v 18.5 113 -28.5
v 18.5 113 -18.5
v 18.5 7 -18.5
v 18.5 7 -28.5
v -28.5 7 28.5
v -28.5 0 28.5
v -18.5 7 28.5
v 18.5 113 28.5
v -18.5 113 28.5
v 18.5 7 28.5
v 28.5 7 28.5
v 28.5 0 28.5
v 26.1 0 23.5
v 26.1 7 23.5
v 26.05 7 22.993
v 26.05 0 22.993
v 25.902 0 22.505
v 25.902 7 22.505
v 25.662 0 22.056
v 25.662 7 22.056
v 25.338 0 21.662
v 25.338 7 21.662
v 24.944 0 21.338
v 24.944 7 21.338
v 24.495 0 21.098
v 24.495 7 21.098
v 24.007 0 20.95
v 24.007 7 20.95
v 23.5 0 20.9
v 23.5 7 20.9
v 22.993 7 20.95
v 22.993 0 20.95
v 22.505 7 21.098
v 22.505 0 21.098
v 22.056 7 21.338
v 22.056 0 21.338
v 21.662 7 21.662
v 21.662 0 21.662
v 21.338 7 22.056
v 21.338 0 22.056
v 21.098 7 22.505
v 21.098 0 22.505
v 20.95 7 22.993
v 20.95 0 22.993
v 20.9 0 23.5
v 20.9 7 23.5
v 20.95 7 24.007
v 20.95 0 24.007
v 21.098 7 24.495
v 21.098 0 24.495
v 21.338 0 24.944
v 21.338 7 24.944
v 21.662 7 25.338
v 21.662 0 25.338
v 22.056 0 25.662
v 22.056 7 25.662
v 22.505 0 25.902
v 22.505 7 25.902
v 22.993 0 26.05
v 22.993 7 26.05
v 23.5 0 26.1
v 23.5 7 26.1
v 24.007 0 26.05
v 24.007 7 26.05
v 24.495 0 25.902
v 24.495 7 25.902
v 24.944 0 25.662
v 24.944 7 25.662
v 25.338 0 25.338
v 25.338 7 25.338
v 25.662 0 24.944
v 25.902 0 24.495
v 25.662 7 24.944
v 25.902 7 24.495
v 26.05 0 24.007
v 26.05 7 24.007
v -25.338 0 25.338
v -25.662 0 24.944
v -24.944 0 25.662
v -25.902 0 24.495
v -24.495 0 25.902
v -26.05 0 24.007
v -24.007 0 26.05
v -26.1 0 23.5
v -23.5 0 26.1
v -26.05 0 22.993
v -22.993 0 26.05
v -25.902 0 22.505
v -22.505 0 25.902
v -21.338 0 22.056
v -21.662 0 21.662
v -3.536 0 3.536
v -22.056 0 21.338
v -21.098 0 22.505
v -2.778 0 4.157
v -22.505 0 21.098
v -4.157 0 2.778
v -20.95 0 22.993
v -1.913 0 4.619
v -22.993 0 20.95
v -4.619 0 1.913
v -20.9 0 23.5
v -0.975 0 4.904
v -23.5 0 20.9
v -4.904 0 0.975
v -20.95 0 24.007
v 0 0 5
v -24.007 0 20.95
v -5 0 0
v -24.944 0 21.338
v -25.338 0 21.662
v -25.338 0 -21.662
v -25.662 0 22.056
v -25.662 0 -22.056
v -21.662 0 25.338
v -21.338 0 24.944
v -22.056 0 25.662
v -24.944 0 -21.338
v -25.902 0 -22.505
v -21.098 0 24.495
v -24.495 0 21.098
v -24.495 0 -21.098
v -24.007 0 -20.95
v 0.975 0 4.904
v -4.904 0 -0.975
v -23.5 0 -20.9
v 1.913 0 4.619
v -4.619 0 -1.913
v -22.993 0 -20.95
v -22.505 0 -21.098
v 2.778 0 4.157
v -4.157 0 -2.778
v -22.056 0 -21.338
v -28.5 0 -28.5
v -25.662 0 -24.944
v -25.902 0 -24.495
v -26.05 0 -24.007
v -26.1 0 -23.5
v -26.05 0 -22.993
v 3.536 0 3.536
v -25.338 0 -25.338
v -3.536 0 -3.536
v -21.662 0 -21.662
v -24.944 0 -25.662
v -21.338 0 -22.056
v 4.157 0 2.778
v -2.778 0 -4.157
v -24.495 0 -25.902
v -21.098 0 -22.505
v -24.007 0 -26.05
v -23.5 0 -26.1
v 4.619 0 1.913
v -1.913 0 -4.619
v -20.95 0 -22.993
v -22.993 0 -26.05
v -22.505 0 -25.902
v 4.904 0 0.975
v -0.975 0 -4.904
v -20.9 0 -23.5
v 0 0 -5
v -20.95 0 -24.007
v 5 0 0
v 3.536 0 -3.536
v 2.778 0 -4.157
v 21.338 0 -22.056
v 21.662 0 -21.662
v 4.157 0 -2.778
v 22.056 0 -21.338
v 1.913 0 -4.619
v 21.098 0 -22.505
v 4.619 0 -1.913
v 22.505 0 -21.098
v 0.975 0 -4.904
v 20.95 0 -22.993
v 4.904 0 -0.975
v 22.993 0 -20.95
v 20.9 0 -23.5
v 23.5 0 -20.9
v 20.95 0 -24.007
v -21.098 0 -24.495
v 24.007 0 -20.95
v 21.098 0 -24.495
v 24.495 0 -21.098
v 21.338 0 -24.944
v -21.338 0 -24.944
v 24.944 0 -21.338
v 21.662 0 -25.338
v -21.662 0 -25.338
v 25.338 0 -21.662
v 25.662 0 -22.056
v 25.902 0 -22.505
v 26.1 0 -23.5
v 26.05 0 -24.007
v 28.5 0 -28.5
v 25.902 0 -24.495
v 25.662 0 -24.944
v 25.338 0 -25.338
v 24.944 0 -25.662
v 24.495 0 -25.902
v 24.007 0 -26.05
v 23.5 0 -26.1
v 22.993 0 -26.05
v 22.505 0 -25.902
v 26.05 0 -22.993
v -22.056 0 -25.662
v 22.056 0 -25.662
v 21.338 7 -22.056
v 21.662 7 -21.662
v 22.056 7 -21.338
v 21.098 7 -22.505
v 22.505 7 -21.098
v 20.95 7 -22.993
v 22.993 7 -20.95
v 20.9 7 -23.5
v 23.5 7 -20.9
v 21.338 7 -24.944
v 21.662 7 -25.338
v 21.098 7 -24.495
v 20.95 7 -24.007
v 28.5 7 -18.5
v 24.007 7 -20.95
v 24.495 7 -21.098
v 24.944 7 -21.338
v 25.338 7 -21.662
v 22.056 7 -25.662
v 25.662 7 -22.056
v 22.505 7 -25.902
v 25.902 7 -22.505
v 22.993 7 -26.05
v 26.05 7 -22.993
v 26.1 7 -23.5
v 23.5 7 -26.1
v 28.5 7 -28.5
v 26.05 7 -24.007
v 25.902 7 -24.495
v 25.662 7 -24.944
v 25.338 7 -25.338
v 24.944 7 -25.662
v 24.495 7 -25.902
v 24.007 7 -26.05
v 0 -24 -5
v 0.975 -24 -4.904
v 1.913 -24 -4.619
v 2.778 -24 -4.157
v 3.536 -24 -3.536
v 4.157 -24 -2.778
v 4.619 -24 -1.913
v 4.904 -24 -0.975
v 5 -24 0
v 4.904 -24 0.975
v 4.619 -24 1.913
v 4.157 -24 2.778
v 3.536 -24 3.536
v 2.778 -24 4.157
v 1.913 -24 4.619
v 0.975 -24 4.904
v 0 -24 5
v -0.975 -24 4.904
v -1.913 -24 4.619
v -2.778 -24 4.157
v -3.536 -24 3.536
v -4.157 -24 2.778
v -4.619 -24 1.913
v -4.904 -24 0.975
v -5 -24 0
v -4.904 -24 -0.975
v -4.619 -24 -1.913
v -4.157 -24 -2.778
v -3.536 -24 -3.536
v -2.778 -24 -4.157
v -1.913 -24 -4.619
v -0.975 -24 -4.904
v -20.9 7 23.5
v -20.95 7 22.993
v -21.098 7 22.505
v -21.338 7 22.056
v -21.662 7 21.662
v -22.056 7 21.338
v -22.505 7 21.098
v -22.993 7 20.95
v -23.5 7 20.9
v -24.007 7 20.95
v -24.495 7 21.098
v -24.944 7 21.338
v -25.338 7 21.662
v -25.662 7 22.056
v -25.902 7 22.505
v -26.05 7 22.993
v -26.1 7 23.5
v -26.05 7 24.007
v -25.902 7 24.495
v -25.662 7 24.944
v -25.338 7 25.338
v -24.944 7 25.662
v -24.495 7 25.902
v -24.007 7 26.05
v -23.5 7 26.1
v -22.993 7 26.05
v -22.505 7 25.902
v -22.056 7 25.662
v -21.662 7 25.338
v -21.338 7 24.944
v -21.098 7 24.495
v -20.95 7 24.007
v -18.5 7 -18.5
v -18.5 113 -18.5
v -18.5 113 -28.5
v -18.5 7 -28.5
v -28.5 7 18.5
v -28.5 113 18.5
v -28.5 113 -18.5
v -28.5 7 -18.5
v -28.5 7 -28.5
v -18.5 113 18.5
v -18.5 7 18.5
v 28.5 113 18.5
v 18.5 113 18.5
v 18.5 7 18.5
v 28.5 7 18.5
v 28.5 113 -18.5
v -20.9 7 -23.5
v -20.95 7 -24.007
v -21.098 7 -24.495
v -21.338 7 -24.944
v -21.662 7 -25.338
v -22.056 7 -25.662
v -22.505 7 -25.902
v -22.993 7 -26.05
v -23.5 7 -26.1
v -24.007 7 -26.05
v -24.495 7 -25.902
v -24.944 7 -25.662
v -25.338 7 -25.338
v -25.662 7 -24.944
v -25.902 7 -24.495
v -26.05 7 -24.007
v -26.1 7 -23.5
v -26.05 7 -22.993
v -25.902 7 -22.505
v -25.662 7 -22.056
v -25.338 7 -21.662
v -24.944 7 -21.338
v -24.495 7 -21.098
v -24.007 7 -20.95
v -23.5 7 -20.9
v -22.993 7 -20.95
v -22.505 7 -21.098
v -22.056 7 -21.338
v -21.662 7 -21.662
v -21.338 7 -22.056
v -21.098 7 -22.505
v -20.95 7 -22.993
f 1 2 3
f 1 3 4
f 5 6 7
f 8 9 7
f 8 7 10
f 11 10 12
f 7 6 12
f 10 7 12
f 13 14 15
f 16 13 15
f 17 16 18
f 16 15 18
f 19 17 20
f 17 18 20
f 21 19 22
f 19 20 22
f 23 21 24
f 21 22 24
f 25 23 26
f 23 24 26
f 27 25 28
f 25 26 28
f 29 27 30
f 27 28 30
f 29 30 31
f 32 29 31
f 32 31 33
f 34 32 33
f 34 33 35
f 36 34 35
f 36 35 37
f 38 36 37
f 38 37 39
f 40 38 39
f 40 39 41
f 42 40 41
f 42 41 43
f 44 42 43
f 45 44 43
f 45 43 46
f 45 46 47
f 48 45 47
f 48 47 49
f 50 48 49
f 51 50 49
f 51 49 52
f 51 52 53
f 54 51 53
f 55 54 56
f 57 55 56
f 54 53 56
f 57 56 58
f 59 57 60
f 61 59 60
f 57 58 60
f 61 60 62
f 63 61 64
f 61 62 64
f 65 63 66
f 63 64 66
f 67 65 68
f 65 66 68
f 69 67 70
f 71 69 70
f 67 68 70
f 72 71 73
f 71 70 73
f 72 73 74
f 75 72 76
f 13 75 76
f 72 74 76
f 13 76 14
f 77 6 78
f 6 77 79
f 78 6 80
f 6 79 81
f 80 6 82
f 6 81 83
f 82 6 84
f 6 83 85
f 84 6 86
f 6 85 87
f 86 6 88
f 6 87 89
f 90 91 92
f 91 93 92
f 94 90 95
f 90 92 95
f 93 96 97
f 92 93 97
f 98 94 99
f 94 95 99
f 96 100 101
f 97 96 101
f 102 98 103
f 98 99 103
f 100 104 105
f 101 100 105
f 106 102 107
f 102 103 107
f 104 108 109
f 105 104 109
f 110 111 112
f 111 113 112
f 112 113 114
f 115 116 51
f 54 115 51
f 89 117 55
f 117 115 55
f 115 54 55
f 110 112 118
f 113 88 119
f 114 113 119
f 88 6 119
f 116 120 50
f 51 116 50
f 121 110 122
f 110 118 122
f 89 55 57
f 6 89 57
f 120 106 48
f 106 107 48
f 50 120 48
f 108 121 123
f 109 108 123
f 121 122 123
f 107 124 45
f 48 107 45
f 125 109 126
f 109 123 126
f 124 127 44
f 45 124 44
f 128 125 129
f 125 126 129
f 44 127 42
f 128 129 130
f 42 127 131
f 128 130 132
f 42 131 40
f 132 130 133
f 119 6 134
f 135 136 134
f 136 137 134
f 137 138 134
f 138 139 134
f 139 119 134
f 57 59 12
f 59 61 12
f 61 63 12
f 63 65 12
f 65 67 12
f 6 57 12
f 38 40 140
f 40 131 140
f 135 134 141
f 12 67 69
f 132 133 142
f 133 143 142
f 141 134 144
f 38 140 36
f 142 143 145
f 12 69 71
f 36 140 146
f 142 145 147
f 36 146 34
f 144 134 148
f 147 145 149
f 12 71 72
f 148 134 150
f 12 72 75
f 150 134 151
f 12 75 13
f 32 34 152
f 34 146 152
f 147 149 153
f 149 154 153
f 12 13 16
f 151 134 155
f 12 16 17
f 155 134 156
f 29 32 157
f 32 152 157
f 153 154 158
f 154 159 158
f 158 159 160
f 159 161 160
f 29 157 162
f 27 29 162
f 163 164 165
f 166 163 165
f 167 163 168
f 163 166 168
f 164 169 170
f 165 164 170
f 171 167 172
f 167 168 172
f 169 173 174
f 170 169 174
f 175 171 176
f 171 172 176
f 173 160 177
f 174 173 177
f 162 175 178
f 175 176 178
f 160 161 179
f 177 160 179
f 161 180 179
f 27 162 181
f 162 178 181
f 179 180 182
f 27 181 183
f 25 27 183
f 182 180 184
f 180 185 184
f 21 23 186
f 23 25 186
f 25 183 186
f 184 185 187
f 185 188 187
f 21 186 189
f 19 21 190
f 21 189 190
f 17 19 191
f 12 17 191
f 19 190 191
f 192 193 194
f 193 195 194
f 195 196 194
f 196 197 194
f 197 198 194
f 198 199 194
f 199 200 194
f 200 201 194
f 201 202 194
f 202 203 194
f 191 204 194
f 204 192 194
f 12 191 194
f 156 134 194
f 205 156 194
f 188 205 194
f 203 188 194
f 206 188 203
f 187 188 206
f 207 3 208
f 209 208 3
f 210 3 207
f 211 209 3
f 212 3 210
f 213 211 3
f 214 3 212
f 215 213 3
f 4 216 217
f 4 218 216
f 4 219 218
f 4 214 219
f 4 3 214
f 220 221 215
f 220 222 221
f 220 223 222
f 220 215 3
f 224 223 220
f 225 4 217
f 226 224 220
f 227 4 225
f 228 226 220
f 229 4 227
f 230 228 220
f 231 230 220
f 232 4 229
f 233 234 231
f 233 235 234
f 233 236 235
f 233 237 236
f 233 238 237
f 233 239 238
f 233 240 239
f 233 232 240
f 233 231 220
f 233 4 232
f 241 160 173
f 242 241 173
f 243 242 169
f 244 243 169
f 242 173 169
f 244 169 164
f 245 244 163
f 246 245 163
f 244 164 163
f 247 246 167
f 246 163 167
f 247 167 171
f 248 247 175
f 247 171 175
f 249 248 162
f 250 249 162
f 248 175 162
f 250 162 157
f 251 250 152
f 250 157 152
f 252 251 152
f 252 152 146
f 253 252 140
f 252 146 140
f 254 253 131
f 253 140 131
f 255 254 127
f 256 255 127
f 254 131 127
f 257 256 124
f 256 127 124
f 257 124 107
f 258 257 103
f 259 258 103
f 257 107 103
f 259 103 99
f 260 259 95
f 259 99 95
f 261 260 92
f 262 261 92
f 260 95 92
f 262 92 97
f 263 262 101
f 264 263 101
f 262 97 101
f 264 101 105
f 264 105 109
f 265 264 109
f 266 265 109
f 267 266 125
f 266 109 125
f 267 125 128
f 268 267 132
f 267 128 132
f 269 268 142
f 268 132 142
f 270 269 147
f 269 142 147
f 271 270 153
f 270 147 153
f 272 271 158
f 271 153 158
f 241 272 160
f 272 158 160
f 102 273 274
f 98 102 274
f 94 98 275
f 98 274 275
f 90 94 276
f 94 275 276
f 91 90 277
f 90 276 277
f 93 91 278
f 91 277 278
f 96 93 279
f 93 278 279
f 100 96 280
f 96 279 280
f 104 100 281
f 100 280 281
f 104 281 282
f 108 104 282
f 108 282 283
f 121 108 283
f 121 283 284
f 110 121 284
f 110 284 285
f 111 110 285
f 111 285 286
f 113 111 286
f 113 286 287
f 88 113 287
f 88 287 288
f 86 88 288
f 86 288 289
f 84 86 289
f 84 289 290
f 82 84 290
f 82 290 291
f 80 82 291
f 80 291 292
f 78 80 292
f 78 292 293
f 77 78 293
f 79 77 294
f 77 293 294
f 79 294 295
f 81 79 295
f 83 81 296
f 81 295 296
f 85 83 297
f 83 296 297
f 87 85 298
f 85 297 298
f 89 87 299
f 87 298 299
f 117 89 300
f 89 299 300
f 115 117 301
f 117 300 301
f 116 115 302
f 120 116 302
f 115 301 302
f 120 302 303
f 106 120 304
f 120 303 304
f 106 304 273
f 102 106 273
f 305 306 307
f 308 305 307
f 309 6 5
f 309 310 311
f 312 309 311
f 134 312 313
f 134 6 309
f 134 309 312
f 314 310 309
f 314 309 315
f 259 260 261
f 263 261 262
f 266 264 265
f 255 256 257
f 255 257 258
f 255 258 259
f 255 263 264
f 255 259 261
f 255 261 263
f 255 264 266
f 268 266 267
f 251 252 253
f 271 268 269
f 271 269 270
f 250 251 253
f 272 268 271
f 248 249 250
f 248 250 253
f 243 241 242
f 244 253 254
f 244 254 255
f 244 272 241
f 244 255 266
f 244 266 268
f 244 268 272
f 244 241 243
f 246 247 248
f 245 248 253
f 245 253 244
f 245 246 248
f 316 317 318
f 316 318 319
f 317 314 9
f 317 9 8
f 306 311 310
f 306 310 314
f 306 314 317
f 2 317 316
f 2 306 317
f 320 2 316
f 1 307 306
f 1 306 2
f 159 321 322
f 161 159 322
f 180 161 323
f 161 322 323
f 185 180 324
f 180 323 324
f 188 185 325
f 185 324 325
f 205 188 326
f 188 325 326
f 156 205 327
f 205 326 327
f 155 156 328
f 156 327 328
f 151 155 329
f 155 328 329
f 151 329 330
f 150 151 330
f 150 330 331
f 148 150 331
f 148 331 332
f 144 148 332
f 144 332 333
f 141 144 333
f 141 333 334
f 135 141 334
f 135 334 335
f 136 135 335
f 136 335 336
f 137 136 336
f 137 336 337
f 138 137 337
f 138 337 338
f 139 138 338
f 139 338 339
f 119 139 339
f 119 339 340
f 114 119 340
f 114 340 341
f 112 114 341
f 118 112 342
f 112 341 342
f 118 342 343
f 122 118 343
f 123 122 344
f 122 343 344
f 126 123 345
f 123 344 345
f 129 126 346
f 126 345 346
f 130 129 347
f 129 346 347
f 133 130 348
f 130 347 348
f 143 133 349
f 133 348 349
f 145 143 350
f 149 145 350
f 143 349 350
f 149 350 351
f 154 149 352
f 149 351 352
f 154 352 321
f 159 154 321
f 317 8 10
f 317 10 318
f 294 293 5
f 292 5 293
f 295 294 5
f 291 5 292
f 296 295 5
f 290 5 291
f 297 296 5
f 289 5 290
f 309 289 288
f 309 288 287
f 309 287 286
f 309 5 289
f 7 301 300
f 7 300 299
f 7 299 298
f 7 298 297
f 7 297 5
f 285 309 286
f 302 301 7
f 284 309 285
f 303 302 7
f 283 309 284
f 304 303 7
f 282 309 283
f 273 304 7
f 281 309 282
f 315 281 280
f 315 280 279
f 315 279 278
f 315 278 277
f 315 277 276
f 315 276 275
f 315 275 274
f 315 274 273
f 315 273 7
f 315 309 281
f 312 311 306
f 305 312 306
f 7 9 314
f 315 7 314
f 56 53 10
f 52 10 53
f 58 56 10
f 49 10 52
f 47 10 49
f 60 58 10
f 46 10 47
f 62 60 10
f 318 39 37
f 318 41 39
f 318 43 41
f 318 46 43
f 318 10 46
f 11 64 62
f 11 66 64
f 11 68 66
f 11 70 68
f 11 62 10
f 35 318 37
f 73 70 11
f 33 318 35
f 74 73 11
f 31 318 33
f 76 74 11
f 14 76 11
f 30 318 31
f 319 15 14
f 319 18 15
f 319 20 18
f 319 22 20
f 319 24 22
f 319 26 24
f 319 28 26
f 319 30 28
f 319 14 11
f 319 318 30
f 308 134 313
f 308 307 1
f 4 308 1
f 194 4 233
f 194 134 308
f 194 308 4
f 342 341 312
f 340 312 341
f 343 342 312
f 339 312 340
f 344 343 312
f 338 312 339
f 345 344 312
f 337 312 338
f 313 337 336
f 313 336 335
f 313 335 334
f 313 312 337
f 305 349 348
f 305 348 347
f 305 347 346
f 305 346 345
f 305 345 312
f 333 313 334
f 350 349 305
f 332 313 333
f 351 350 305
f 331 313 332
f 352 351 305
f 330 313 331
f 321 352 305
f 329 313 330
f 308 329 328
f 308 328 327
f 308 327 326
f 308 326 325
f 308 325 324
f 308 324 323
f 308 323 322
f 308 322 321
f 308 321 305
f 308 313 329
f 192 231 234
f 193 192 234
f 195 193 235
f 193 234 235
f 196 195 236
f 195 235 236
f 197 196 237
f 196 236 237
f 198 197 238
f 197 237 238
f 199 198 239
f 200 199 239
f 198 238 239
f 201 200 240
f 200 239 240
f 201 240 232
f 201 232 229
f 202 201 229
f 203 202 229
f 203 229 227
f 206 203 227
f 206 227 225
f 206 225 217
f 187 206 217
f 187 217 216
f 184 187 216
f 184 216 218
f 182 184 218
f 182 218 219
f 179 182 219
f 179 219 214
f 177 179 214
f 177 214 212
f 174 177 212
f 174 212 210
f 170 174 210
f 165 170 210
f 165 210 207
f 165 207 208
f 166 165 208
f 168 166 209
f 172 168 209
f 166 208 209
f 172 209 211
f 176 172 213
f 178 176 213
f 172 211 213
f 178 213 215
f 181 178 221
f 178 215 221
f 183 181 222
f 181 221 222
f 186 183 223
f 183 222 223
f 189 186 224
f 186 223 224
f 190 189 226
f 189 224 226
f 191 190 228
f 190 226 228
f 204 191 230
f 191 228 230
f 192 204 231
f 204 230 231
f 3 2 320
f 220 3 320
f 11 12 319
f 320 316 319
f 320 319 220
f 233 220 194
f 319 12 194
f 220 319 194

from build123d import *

# Parameters (mm, degrees)
CROQUIS1_W                   = 57
CROQUIS1_H                   = 57
SALIENTE_EXTRUIR1_DEPTH      = 113
CROQUIS2_R                   = 5
SALIENTE_EXTRUIR2_DEPTH      = 24
TALADRO_DE_MARGEN_PARA_M51_D = 5.2
CROQUIS8_W                   = 10
CROQUIS8_H                   = 10
CROQUIS8_R                   = 2.6
CORTAR_EXTRUIR1_DEPTH        = 106


with BuildPart() as part:
    # Croquis1 → Saliente-Extruir1 (new body)
    with BuildSketch(Plane(origin=(0, 0, 0), x_dir=(1, 0, 0), z_dir=(0, 1, 0))):
        Rectangle(CROQUIS1_W, CROQUIS1_H)
    extrude(amount=SALIENTE_EXTRUIR1_DEPTH)

    # Croquis2 → Saliente-Extruir2 (add)
    with BuildSketch(Plane(origin=(0, 0, 0), x_dir=(-1, 0, 0), z_dir=(0, -1, 0))):
        with Locations(Location((0, 0, 0), (0, 0, 90))):
            Circle(CROQUIS2_R)
    extrude(amount=SALIENTE_EXTRUIR2_DEPTH)

    # Taladro de margen para M51 (through all)
    with Locations(Plane(origin=(0, 0, 0), x_dir=(-1, 0, 0), z_dir=(0, -1, 0))):
        with Locations((23.5, -23.5), (-23.5, -23.5), (-23.5, 23.5), (23.5, 23.5)):
            Hole(TALADRO_DE_MARGEN_PARA_M51_D / 2)

    # Croquis8 → Cortar-Extruir1 (cut)
    # profile 1 of 6: a face of its own
    with BuildSketch(Plane(origin=(0, 113, 0), x_dir=(1, 0, 0), z_dir=(0, 1, 0))):
        with Locations((-23.5, -23.5)):
            Rectangle(CROQUIS8_W, CROQUIS8_H)
        with Locations(Location((-23.5, -23.5, 0), (0, 0, 90))):
            Circle(CROQUIS8_R, mode=Mode.SUBTRACT)
    # profile 2 of 6: a face of its own
    with BuildSketch(Plane(origin=(0, 113, 0), x_dir=(1, 0, 0), z_dir=(0, 1, 0))):
        with Locations((23.5, -23.5)):
            Rectangle(CROQUIS8_W, CROQUIS8_H)
        with Locations(Location((23.5, -23.5, 0), (0, 0, 90))):
            Circle(CROQUIS8_R, mode=Mode.SUBTRACT)
    # profile 3 of 6: a face of its own
    with BuildSketch(Plane(origin=(0, 113, 0), x_dir=(1, 0, 0), z_dir=(0, 1, 0))):
        with Locations(Location((23.5, -23.5, 0), (0, 0, 90))):
            Circle(CROQUIS8_R)
    # profile 4 of 6: a face of its own
    with BuildSketch(Plane(origin=(0, 113, 0), x_dir=(1, 0, 0), z_dir=(0, 1, 0))):
        with Locations((-23.5, 23.5)):
            Rectangle(CROQUIS8_W, CROQUIS8_H)
        with Locations(Location((-23.5, 23.5, 0), (0, 0, 90))):
            Circle(CROQUIS8_R, mode=Mode.SUBTRACT)
    # profile 5 of 6: a face of its own
    with BuildSketch(Plane(origin=(0, 113, 0), x_dir=(1, 0, 0), z_dir=(0, 1, 0))):
        with Locations(Location((-23.5, 23.5, 0), (0, 0, 90))):
            Circle(CROQUIS8_R)
    # profile 6 of 6: a face of its own
    with BuildSketch(Plane(origin=(0, 113, 0), x_dir=(1, 0, 0), z_dir=(0, 1, 0))):
        with Locations((23.5, 23.5)):
            Rectangle(CROQUIS8_W, CROQUIS8_H)
    extrude(amount=-CORTAR_EXTRUIR1_DEPTH, mode=Mode.SUBTRACT)


solid = part.part
